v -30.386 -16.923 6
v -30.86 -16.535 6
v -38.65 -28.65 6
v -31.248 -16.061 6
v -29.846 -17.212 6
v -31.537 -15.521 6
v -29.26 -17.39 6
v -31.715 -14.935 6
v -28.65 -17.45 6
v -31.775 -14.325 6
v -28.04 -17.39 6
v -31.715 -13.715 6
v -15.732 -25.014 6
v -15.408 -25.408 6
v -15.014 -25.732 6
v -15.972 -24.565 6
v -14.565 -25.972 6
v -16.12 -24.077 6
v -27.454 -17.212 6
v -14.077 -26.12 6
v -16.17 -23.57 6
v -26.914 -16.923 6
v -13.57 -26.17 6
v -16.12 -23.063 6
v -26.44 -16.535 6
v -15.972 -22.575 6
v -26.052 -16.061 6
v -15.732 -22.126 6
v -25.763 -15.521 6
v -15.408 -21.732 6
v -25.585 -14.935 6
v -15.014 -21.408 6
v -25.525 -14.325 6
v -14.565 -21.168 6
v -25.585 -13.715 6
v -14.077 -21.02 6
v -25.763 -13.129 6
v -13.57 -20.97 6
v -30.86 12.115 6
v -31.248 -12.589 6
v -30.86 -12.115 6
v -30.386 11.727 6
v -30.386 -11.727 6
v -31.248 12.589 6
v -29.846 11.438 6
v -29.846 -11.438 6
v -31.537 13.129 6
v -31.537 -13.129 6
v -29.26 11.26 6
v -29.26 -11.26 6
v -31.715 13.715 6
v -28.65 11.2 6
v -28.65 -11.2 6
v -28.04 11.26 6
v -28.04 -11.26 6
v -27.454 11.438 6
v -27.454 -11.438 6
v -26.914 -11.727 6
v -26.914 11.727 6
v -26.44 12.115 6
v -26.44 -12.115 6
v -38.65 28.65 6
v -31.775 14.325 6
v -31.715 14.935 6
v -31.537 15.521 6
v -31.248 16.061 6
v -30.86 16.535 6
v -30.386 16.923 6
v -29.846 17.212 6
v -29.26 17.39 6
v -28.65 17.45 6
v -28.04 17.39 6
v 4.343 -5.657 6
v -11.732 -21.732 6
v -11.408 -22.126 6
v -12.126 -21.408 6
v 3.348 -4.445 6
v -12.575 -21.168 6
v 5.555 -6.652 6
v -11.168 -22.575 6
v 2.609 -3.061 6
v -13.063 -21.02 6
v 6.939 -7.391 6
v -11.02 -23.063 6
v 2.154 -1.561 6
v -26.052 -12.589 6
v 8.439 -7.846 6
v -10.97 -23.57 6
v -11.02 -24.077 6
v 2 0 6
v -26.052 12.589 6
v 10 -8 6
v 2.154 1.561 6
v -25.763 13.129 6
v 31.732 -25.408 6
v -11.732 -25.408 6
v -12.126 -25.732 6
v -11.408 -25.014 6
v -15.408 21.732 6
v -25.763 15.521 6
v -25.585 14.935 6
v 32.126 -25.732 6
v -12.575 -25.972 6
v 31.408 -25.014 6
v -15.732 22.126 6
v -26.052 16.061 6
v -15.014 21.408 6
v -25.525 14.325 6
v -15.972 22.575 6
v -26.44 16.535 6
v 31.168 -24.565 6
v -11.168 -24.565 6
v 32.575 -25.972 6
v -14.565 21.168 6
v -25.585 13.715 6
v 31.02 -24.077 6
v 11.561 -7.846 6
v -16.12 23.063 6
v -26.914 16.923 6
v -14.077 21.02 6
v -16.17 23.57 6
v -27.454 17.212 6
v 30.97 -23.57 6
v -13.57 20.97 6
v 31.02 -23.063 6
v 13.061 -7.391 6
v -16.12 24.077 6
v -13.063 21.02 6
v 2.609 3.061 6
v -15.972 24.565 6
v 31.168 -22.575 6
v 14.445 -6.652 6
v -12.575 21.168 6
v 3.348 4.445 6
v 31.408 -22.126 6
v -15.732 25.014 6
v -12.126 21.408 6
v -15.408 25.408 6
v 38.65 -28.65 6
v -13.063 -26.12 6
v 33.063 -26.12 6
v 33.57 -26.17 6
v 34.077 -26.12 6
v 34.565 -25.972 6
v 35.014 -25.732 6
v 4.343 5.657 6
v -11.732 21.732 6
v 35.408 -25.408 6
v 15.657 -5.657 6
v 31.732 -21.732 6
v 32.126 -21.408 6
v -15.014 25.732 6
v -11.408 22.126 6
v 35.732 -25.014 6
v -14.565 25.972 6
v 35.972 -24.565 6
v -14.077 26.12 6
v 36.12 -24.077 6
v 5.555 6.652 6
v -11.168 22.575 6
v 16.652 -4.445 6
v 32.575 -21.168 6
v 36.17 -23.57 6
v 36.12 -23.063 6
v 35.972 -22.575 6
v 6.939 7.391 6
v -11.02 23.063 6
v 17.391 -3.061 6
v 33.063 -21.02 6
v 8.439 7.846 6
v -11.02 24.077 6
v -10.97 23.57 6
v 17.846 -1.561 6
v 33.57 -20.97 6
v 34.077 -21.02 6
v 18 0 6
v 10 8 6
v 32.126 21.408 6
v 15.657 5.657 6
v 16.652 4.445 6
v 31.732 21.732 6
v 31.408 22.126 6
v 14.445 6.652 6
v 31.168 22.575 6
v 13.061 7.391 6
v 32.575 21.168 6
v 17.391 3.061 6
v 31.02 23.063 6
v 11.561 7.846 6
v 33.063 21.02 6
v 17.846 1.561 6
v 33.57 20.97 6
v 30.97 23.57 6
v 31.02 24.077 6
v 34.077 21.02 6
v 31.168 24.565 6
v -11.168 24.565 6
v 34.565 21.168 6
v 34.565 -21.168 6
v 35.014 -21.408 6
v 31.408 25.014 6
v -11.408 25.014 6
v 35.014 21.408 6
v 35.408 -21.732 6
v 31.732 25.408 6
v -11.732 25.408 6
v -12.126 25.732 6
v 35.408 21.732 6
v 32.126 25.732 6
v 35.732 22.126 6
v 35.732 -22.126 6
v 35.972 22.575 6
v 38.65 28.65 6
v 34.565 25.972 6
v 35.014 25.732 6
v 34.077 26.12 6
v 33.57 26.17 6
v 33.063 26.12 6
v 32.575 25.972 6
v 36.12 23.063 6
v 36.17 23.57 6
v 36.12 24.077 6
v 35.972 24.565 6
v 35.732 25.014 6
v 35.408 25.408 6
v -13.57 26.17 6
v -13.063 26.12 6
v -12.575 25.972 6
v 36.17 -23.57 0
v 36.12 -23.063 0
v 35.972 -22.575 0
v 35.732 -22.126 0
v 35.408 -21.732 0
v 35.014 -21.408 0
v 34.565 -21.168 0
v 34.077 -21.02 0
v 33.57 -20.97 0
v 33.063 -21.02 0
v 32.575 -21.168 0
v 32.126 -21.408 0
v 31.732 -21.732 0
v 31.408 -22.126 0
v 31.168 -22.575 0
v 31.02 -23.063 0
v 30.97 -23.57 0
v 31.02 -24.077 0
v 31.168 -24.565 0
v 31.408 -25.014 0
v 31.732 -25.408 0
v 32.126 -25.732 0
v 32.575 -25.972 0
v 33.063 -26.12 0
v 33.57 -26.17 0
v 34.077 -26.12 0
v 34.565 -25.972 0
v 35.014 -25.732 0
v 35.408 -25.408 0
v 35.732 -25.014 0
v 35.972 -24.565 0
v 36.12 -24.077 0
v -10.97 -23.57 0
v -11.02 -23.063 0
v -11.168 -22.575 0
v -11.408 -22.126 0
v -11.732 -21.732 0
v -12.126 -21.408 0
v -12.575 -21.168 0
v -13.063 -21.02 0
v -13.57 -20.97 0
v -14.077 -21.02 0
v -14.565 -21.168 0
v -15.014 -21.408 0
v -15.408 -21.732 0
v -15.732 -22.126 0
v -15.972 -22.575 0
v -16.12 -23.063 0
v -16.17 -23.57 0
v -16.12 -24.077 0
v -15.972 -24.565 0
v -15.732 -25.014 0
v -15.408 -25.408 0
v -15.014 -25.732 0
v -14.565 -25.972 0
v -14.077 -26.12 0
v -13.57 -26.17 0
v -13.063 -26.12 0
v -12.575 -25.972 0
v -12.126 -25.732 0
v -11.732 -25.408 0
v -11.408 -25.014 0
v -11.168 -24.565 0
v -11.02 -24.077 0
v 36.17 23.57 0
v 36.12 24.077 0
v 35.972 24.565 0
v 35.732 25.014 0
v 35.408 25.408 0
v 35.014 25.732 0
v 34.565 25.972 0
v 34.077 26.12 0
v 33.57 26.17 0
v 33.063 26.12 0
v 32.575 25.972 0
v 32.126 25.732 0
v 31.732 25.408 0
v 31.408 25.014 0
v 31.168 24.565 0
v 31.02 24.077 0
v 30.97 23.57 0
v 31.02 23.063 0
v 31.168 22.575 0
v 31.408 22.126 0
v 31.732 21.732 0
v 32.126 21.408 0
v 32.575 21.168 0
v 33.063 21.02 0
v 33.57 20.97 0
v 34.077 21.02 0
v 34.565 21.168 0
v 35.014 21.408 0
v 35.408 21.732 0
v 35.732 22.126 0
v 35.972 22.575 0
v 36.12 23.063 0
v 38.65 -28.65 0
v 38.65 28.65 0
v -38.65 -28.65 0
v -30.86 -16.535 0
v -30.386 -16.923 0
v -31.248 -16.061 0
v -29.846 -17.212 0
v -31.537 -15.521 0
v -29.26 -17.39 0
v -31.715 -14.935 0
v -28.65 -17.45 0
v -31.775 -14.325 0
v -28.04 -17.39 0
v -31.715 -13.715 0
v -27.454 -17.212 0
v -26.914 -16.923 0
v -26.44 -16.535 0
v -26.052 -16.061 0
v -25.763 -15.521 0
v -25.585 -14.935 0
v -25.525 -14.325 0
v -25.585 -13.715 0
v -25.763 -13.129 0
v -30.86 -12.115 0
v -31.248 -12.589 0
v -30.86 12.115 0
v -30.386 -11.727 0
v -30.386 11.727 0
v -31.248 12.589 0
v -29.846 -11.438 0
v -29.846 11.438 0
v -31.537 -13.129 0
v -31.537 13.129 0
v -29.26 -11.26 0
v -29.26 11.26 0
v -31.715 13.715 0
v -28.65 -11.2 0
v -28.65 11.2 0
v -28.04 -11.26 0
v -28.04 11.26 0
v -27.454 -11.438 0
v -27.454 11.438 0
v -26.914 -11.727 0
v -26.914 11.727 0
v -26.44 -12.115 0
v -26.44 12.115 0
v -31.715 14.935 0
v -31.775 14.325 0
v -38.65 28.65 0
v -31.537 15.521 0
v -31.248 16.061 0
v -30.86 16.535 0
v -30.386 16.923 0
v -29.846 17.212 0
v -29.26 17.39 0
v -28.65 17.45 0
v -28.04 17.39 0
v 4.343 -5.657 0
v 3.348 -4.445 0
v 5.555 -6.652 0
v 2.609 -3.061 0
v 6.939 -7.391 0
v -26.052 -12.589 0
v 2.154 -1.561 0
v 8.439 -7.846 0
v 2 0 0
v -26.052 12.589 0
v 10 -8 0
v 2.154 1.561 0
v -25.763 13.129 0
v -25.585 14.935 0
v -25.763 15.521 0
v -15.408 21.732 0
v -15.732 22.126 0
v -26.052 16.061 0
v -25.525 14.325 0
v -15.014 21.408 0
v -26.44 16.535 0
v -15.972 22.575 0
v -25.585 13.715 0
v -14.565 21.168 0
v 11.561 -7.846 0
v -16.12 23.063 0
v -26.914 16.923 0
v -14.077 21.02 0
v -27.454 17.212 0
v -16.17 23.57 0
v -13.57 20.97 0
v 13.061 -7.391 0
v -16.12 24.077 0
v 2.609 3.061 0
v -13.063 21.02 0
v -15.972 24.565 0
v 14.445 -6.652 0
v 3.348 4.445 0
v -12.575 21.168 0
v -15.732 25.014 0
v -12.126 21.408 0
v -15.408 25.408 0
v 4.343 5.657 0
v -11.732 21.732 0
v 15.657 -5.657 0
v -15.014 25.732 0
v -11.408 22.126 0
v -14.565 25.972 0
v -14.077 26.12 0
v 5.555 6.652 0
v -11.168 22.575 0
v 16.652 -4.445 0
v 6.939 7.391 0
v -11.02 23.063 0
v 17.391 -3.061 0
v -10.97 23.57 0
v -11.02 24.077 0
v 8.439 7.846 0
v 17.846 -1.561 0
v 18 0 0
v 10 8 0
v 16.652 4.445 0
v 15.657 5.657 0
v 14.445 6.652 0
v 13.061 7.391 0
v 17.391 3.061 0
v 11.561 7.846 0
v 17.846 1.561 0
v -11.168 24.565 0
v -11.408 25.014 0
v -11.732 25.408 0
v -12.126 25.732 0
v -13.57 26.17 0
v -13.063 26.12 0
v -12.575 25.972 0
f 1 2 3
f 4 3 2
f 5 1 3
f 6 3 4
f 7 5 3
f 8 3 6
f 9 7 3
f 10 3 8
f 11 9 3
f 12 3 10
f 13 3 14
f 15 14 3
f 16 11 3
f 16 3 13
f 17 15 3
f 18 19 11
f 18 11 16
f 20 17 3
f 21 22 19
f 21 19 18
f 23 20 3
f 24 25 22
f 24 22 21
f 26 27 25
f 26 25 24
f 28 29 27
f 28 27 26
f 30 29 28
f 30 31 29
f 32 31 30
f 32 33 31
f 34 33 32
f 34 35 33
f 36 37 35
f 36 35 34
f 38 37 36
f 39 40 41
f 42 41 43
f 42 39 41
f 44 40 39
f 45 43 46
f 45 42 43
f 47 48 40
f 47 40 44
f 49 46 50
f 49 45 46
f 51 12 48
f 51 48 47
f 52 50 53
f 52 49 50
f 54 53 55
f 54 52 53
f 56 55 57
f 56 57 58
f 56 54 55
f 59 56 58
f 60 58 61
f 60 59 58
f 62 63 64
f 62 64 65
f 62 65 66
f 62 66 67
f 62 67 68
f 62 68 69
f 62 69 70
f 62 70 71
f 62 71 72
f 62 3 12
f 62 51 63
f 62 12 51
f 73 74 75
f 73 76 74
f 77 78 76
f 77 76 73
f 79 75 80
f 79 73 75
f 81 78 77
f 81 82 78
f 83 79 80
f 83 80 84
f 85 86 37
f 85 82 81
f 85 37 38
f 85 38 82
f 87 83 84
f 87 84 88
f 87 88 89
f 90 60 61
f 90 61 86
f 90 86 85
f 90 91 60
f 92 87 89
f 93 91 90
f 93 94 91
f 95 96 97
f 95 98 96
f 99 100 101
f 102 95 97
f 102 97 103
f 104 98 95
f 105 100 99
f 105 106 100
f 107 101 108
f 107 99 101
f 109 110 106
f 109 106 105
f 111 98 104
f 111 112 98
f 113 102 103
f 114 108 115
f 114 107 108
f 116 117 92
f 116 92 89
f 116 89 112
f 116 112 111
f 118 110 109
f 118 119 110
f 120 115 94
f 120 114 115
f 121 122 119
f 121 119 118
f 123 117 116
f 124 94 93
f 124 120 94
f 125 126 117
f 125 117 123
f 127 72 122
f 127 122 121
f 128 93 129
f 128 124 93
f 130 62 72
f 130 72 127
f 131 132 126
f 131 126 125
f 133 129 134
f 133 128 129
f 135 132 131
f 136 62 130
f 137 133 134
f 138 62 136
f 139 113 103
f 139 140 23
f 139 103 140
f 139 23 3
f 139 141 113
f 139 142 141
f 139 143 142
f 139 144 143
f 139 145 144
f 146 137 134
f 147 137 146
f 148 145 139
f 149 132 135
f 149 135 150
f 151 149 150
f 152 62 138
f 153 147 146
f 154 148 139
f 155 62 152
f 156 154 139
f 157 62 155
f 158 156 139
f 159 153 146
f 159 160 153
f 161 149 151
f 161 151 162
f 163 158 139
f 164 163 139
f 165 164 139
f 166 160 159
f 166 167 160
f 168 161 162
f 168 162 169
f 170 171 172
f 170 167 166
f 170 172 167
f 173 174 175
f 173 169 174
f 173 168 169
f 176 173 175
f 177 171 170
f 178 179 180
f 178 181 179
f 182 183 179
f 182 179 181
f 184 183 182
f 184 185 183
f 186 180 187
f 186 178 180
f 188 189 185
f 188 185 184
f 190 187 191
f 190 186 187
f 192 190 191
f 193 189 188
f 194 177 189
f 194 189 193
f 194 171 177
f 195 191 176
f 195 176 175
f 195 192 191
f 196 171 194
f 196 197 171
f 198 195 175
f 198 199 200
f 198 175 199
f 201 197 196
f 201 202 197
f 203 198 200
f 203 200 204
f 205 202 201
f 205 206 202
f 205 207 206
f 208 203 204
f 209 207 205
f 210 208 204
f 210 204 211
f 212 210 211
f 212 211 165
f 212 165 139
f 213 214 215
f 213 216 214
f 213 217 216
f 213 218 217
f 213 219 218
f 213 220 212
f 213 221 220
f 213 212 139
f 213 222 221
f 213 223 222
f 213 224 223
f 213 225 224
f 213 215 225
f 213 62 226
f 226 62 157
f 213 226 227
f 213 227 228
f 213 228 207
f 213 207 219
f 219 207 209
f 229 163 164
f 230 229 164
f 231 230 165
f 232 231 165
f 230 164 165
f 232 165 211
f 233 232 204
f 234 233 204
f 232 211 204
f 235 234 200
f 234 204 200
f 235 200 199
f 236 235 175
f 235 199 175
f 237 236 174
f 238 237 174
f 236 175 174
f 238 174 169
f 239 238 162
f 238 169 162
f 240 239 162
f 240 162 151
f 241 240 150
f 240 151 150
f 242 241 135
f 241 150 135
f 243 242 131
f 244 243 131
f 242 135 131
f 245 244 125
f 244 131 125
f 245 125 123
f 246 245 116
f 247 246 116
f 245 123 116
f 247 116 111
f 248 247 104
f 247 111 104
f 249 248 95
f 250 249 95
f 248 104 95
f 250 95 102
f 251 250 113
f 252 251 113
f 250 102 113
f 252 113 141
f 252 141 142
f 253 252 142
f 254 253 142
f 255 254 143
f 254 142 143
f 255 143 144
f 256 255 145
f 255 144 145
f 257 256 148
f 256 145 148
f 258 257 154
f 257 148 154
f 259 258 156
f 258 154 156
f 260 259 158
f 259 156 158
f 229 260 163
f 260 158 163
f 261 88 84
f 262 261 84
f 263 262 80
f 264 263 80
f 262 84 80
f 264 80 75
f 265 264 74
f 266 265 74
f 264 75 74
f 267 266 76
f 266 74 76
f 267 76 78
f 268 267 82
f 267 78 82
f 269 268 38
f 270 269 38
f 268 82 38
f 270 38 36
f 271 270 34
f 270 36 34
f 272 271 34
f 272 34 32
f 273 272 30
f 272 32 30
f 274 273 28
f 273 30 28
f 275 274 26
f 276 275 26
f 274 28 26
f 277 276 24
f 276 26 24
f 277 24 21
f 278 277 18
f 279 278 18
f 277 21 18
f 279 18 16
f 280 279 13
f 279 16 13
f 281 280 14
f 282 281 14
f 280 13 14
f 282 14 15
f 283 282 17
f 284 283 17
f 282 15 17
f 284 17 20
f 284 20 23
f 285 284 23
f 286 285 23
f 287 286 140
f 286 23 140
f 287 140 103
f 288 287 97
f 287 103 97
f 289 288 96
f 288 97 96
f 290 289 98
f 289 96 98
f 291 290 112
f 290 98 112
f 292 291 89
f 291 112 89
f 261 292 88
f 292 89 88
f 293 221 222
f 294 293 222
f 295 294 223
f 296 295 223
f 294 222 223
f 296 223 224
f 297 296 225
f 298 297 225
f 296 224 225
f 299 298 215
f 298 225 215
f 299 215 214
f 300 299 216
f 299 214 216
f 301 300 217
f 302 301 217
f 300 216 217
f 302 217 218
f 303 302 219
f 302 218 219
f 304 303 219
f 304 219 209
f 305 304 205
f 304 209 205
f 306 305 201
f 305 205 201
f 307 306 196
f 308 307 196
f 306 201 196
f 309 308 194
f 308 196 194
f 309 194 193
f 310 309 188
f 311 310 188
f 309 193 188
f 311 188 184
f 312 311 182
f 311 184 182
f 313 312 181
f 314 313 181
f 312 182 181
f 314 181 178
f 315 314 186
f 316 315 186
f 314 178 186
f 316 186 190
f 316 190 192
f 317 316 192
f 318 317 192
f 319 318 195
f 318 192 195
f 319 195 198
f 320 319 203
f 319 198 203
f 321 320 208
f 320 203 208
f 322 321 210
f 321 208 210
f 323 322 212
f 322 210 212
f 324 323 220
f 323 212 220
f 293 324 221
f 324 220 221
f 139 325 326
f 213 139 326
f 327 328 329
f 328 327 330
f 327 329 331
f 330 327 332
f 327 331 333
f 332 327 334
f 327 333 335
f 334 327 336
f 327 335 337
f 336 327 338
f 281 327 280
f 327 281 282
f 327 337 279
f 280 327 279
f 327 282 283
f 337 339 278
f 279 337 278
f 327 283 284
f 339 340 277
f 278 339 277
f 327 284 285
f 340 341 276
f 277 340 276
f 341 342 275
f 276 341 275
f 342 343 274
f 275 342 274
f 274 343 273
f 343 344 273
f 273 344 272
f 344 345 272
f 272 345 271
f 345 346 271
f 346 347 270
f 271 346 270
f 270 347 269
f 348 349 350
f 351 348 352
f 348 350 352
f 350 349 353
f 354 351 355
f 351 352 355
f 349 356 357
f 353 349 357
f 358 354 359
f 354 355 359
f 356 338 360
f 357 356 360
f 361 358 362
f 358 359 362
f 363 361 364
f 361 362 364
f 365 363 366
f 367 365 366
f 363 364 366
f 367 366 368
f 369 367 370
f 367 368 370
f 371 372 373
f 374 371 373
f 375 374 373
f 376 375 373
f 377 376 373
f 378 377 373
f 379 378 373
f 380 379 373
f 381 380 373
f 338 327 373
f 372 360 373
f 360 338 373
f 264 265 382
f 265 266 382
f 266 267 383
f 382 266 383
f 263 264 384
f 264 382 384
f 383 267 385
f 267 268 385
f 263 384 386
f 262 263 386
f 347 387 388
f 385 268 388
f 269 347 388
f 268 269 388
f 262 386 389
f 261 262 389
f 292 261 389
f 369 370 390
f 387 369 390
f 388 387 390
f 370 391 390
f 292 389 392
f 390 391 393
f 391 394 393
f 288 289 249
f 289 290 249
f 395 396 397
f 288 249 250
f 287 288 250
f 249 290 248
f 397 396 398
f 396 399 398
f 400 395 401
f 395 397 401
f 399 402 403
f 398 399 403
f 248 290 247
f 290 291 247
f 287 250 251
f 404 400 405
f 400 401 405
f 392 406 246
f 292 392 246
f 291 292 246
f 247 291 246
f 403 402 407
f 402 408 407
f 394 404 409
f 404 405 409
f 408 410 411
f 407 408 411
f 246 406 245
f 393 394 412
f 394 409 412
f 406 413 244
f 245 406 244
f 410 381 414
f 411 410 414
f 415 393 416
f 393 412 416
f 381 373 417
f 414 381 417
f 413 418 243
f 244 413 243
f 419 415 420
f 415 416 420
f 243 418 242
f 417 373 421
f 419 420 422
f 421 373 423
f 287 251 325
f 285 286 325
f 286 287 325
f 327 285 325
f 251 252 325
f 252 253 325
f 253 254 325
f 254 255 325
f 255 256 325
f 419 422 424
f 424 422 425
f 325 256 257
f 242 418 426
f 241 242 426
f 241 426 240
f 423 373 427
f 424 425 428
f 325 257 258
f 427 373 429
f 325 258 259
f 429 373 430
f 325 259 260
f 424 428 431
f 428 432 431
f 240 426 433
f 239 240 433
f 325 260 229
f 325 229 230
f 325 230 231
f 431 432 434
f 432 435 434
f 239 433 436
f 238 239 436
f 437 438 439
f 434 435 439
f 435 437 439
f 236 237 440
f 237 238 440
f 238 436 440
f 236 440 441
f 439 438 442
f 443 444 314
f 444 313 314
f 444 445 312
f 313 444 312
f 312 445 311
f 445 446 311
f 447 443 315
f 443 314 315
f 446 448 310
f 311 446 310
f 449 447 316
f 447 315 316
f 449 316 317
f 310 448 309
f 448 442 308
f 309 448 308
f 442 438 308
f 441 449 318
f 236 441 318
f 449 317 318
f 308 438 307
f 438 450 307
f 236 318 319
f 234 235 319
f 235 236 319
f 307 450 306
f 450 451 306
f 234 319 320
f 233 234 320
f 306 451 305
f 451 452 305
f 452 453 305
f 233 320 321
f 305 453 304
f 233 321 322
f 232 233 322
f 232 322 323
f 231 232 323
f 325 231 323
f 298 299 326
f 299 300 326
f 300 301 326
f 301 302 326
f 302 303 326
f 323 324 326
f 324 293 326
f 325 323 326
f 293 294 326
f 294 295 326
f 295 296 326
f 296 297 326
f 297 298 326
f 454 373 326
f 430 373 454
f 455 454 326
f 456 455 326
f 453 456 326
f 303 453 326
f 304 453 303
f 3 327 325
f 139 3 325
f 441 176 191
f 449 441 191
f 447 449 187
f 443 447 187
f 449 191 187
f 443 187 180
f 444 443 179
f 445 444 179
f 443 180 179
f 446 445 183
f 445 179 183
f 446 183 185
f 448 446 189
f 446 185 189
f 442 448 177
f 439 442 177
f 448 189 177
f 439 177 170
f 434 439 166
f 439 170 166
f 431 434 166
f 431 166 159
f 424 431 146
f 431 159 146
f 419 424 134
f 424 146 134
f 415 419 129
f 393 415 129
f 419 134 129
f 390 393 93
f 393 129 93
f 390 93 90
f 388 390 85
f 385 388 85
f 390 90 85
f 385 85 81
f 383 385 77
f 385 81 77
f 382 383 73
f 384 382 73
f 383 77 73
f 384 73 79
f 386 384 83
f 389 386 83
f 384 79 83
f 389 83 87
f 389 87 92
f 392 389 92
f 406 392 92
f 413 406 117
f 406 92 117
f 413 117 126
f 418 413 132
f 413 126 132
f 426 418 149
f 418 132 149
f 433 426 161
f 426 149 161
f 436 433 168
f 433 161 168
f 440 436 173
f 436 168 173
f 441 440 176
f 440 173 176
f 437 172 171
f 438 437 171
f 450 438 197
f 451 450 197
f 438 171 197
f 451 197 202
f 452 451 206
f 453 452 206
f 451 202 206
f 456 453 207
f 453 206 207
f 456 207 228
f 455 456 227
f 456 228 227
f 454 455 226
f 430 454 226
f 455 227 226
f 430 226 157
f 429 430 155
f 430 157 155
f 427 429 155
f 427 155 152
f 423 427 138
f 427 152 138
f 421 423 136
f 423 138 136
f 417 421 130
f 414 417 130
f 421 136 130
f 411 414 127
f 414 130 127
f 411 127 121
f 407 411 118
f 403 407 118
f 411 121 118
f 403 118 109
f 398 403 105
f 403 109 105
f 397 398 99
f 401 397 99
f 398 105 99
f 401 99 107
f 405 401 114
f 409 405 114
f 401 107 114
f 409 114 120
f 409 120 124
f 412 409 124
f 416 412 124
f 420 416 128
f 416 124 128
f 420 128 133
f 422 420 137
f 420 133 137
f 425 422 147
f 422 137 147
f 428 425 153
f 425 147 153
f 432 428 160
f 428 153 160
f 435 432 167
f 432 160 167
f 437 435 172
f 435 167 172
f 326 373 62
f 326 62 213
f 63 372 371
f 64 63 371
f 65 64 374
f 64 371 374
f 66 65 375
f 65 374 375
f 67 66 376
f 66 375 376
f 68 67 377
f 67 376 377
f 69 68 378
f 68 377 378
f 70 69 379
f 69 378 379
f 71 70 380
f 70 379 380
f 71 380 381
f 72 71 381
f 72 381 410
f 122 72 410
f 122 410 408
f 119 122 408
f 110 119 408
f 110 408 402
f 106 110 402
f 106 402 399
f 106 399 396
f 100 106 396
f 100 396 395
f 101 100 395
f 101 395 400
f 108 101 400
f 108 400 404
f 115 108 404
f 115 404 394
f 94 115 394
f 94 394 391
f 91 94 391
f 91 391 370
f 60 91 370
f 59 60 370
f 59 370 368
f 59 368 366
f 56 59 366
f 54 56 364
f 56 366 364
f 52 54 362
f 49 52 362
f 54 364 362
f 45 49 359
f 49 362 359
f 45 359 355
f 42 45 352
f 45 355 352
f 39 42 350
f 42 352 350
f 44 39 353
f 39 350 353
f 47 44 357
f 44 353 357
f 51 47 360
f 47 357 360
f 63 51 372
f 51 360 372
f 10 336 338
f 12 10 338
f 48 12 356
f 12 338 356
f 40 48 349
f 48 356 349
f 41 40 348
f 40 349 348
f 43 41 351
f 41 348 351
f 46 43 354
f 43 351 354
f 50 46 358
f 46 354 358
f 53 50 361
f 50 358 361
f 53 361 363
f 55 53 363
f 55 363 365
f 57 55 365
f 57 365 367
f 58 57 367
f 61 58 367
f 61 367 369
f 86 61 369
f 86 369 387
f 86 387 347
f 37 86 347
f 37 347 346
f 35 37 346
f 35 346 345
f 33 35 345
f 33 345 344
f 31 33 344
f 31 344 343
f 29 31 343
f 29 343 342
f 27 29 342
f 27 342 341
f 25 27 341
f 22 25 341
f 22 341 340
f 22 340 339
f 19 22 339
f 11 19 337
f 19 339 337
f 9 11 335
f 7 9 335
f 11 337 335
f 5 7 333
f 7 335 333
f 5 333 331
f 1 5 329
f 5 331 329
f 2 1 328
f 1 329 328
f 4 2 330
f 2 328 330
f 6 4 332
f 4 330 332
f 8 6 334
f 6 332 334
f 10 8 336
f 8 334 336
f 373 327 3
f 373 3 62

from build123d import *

# Parameters (mm, degrees)
SKETCH1_W                        = 77.3
SKETCH1_H                        = 57.3
BOSS_EXTRUDE1_DEPTH              = 6
SKETCH2_R                        = 8
SKETCH2_R_2                      = 2.6
CUT_EXTRUDE1_DEPTH               = 6
TAP_DRILL_FOR_M6_HELICOIL1_D     = 6.25
TAP_DRILL_FOR_M6_HELICOIL1_DEPTH = 20
TAP_DRILL_FOR_M6_HELICOIL1_TIP   = 1.877689434


with BuildPart() as part:
    # Sketch1 → Boss-Extrude1 (new body)
    with BuildSketch(Plane.XY):
        Rectangle(SKETCH1_W, SKETCH1_H)
    extrude(amount=BOSS_EXTRUDE1_DEPTH)

    # Sketch2 → Cut-Extrude1 (cut)
    with BuildSketch(Plane.XY.offset(6)):
        with Locations((10, 0)):
            Circle(SKETCH2_R)
        with Locations((-13.57, 23.57)):
            Circle(SKETCH2_R_2)
        with Locations((33.57, 23.57)):
            Circle(SKETCH2_R_2)
        with Locations((33.57, -23.57)):
            Circle(SKETCH2_R_2)
        with Locations((-13.57, -23.57)):
            Circle(SKETCH2_R_2)
    extrude(amount=-CUT_EXTRUDE1_DEPTH, mode=Mode.SUBTRACT)

    # Tap Drill for M6 Helicoil1
    with Locations(Plane(origin=(-28.65, 14.325, 6), x_dir=(1, 0, 0), z_dir=(0, 0, 1))):
        with Locations((0, 0), (0, -28.65)):
            Hole(TAP_DRILL_FOR_M6_HELICOIL1_D / 2, depth=TAP_DRILL_FOR_M6_HELICOIL1_DEPTH)
            with Locations((0, 0, -(TAP_DRILL_FOR_M6_HELICOIL1_DEPTH + TAP_DRILL_FOR_M6_HELICOIL1_TIP / 2))):  # 118° drill point
                Cone(0, TAP_DRILL_FOR_M6_HELICOIL1_D / 2, TAP_DRILL_FOR_M6_HELICOIL1_TIP, mode=Mode.SUBTRACT)


solid = part.part
